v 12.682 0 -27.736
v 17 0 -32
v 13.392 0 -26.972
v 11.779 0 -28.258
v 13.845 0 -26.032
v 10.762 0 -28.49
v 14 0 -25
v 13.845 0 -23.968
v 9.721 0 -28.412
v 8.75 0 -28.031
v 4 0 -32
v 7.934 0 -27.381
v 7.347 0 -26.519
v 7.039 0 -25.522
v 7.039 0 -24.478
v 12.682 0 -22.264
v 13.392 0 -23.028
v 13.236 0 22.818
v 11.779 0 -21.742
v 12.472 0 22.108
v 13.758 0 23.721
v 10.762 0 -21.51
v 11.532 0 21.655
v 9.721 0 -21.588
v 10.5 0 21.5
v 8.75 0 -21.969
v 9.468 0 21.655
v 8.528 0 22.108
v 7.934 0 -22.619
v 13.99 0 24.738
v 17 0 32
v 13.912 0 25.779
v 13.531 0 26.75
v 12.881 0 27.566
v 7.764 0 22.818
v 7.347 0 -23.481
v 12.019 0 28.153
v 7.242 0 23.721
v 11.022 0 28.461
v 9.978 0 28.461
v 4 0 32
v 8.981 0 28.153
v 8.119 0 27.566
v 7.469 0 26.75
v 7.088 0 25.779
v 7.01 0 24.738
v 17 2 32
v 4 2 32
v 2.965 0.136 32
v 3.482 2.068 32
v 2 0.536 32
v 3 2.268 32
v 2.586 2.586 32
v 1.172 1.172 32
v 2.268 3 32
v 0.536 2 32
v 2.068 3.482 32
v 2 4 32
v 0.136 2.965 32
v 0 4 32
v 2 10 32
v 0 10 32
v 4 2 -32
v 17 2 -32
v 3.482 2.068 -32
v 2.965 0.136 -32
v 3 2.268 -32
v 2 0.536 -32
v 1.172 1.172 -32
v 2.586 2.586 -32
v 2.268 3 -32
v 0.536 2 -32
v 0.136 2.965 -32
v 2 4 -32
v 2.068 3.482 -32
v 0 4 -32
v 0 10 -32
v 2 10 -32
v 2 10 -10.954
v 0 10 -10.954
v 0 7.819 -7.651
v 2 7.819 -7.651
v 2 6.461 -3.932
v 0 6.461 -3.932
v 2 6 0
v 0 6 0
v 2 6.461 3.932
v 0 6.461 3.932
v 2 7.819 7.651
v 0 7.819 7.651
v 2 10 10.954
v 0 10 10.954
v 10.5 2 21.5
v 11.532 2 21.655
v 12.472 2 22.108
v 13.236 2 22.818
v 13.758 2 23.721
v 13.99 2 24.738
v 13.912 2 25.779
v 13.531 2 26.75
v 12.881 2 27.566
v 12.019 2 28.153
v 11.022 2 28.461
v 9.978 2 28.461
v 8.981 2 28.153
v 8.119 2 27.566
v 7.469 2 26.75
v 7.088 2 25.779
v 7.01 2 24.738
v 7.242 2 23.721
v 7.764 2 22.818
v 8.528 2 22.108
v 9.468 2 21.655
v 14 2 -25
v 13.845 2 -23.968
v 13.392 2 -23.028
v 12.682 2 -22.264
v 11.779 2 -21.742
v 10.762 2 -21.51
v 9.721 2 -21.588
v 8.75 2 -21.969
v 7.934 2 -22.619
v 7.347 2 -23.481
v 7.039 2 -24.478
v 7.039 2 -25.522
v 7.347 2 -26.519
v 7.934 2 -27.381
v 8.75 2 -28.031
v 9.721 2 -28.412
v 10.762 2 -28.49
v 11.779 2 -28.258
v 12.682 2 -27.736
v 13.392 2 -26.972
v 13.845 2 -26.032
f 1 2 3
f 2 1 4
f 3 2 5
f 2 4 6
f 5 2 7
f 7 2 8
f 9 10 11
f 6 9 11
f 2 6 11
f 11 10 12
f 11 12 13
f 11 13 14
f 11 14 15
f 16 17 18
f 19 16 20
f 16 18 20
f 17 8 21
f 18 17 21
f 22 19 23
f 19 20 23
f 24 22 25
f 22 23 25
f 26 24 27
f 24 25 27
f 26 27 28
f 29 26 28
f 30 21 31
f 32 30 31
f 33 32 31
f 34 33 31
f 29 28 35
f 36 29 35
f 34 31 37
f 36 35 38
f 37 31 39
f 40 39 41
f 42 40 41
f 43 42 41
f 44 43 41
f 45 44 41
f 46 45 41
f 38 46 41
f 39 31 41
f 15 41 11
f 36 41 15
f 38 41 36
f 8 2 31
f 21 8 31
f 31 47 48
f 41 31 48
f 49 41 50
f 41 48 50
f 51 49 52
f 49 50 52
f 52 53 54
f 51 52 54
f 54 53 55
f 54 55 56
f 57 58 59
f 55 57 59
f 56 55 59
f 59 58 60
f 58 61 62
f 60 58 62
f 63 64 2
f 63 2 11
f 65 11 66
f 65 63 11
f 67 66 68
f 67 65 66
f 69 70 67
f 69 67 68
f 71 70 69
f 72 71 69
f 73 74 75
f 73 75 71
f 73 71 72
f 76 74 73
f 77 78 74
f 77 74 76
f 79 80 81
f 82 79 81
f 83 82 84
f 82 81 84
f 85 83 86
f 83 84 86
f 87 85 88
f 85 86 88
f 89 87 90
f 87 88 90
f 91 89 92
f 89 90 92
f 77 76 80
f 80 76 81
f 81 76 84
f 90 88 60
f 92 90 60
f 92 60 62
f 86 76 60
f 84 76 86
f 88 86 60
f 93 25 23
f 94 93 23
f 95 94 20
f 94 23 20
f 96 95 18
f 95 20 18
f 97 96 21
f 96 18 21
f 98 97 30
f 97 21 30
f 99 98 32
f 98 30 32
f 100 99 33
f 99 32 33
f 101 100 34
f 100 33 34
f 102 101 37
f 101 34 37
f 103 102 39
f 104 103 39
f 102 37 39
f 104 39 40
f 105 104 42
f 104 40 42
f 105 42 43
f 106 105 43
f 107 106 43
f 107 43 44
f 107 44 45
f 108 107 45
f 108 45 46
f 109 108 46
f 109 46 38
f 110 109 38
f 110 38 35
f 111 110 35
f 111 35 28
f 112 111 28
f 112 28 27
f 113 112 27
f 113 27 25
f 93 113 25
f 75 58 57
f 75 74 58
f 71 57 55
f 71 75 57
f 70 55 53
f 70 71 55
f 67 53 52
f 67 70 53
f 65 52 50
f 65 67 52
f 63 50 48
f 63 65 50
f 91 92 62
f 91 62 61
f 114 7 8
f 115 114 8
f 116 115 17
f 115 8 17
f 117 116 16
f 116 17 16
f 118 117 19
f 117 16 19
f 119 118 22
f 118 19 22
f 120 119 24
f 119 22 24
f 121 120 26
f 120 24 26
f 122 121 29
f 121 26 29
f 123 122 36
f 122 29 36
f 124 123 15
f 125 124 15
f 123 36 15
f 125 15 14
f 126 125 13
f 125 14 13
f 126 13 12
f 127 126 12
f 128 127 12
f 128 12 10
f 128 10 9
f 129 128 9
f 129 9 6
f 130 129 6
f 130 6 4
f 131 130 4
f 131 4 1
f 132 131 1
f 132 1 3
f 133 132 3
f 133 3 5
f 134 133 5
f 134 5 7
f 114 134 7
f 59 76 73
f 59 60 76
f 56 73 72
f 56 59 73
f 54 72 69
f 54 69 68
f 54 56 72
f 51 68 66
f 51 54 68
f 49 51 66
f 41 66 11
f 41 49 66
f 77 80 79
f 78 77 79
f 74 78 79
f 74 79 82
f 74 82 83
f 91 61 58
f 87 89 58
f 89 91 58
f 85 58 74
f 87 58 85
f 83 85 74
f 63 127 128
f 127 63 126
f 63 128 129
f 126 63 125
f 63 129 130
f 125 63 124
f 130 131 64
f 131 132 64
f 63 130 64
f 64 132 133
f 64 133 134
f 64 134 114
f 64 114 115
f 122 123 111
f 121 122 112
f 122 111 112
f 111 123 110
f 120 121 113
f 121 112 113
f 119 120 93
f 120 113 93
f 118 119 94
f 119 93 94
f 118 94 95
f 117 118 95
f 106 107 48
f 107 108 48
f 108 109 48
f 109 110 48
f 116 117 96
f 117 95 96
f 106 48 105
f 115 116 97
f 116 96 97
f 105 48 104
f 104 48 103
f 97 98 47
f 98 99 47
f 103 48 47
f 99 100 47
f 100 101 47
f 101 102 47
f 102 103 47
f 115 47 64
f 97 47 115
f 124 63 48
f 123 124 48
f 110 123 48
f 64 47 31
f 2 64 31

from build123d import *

# Parameters (mm, degrees)
EXTRUDE_1_DEPTH     = 32
FILLET_1_R          = 4
FILLET_2_R          = 2
SKETCH_2_R          = 3.5
CUT_EXTRUDE_1_DEPTH = 10
SKETCH_3_R          = 17
CUT_EXTRUDE_2_DEPTH = 10


with BuildPart() as part:
    # 草图1 → 凸台-拉伸1 (new, symmetric)
    with BuildSketch(Plane.XY):
        Polygon((0, 0), (0, 10), (2, 10), (2, 2), (17, 2), (17, 0), align=None)
    extrude(amount=EXTRUDE_1_DEPTH, both=True)

    # 圆角1
    fillet_1_edges = [part.edges().sort_by_distance(p)[0] for p in [
        (0, 0, 0),
    ]]
    fillet(fillet_1_edges, radius=FILLET_1_R)

    # 圆角2
    fillet_2_edges = [part.edges().sort_by_distance(p)[0] for p in [
        (2, 2, 0),
    ]]
    fillet(fillet_2_edges, radius=FILLET_2_R)

    # 草图2 → 切除-拉伸1 (cut)
    with BuildSketch(Plane.XZ):
        with Locations(Location((10.5, 25, 0), (0, 0, 270))):
            Circle(SKETCH_2_R)
        with Locations((10.5, -25)):
            Circle(SKETCH_2_R)
    extrude(amount=-CUT_EXTRUDE_1_DEPTH, mode=Mode.SUBTRACT)

    # 草图3 → 切除-拉伸2 (cut)
    with BuildSketch(Plane.ZY):
        with Locations((0, 23)):
            Circle(SKETCH_3_R)
    extrude(amount=-CUT_EXTRUDE_2_DEPTH, mode=Mode.SUBTRACT)


solid = part.part
